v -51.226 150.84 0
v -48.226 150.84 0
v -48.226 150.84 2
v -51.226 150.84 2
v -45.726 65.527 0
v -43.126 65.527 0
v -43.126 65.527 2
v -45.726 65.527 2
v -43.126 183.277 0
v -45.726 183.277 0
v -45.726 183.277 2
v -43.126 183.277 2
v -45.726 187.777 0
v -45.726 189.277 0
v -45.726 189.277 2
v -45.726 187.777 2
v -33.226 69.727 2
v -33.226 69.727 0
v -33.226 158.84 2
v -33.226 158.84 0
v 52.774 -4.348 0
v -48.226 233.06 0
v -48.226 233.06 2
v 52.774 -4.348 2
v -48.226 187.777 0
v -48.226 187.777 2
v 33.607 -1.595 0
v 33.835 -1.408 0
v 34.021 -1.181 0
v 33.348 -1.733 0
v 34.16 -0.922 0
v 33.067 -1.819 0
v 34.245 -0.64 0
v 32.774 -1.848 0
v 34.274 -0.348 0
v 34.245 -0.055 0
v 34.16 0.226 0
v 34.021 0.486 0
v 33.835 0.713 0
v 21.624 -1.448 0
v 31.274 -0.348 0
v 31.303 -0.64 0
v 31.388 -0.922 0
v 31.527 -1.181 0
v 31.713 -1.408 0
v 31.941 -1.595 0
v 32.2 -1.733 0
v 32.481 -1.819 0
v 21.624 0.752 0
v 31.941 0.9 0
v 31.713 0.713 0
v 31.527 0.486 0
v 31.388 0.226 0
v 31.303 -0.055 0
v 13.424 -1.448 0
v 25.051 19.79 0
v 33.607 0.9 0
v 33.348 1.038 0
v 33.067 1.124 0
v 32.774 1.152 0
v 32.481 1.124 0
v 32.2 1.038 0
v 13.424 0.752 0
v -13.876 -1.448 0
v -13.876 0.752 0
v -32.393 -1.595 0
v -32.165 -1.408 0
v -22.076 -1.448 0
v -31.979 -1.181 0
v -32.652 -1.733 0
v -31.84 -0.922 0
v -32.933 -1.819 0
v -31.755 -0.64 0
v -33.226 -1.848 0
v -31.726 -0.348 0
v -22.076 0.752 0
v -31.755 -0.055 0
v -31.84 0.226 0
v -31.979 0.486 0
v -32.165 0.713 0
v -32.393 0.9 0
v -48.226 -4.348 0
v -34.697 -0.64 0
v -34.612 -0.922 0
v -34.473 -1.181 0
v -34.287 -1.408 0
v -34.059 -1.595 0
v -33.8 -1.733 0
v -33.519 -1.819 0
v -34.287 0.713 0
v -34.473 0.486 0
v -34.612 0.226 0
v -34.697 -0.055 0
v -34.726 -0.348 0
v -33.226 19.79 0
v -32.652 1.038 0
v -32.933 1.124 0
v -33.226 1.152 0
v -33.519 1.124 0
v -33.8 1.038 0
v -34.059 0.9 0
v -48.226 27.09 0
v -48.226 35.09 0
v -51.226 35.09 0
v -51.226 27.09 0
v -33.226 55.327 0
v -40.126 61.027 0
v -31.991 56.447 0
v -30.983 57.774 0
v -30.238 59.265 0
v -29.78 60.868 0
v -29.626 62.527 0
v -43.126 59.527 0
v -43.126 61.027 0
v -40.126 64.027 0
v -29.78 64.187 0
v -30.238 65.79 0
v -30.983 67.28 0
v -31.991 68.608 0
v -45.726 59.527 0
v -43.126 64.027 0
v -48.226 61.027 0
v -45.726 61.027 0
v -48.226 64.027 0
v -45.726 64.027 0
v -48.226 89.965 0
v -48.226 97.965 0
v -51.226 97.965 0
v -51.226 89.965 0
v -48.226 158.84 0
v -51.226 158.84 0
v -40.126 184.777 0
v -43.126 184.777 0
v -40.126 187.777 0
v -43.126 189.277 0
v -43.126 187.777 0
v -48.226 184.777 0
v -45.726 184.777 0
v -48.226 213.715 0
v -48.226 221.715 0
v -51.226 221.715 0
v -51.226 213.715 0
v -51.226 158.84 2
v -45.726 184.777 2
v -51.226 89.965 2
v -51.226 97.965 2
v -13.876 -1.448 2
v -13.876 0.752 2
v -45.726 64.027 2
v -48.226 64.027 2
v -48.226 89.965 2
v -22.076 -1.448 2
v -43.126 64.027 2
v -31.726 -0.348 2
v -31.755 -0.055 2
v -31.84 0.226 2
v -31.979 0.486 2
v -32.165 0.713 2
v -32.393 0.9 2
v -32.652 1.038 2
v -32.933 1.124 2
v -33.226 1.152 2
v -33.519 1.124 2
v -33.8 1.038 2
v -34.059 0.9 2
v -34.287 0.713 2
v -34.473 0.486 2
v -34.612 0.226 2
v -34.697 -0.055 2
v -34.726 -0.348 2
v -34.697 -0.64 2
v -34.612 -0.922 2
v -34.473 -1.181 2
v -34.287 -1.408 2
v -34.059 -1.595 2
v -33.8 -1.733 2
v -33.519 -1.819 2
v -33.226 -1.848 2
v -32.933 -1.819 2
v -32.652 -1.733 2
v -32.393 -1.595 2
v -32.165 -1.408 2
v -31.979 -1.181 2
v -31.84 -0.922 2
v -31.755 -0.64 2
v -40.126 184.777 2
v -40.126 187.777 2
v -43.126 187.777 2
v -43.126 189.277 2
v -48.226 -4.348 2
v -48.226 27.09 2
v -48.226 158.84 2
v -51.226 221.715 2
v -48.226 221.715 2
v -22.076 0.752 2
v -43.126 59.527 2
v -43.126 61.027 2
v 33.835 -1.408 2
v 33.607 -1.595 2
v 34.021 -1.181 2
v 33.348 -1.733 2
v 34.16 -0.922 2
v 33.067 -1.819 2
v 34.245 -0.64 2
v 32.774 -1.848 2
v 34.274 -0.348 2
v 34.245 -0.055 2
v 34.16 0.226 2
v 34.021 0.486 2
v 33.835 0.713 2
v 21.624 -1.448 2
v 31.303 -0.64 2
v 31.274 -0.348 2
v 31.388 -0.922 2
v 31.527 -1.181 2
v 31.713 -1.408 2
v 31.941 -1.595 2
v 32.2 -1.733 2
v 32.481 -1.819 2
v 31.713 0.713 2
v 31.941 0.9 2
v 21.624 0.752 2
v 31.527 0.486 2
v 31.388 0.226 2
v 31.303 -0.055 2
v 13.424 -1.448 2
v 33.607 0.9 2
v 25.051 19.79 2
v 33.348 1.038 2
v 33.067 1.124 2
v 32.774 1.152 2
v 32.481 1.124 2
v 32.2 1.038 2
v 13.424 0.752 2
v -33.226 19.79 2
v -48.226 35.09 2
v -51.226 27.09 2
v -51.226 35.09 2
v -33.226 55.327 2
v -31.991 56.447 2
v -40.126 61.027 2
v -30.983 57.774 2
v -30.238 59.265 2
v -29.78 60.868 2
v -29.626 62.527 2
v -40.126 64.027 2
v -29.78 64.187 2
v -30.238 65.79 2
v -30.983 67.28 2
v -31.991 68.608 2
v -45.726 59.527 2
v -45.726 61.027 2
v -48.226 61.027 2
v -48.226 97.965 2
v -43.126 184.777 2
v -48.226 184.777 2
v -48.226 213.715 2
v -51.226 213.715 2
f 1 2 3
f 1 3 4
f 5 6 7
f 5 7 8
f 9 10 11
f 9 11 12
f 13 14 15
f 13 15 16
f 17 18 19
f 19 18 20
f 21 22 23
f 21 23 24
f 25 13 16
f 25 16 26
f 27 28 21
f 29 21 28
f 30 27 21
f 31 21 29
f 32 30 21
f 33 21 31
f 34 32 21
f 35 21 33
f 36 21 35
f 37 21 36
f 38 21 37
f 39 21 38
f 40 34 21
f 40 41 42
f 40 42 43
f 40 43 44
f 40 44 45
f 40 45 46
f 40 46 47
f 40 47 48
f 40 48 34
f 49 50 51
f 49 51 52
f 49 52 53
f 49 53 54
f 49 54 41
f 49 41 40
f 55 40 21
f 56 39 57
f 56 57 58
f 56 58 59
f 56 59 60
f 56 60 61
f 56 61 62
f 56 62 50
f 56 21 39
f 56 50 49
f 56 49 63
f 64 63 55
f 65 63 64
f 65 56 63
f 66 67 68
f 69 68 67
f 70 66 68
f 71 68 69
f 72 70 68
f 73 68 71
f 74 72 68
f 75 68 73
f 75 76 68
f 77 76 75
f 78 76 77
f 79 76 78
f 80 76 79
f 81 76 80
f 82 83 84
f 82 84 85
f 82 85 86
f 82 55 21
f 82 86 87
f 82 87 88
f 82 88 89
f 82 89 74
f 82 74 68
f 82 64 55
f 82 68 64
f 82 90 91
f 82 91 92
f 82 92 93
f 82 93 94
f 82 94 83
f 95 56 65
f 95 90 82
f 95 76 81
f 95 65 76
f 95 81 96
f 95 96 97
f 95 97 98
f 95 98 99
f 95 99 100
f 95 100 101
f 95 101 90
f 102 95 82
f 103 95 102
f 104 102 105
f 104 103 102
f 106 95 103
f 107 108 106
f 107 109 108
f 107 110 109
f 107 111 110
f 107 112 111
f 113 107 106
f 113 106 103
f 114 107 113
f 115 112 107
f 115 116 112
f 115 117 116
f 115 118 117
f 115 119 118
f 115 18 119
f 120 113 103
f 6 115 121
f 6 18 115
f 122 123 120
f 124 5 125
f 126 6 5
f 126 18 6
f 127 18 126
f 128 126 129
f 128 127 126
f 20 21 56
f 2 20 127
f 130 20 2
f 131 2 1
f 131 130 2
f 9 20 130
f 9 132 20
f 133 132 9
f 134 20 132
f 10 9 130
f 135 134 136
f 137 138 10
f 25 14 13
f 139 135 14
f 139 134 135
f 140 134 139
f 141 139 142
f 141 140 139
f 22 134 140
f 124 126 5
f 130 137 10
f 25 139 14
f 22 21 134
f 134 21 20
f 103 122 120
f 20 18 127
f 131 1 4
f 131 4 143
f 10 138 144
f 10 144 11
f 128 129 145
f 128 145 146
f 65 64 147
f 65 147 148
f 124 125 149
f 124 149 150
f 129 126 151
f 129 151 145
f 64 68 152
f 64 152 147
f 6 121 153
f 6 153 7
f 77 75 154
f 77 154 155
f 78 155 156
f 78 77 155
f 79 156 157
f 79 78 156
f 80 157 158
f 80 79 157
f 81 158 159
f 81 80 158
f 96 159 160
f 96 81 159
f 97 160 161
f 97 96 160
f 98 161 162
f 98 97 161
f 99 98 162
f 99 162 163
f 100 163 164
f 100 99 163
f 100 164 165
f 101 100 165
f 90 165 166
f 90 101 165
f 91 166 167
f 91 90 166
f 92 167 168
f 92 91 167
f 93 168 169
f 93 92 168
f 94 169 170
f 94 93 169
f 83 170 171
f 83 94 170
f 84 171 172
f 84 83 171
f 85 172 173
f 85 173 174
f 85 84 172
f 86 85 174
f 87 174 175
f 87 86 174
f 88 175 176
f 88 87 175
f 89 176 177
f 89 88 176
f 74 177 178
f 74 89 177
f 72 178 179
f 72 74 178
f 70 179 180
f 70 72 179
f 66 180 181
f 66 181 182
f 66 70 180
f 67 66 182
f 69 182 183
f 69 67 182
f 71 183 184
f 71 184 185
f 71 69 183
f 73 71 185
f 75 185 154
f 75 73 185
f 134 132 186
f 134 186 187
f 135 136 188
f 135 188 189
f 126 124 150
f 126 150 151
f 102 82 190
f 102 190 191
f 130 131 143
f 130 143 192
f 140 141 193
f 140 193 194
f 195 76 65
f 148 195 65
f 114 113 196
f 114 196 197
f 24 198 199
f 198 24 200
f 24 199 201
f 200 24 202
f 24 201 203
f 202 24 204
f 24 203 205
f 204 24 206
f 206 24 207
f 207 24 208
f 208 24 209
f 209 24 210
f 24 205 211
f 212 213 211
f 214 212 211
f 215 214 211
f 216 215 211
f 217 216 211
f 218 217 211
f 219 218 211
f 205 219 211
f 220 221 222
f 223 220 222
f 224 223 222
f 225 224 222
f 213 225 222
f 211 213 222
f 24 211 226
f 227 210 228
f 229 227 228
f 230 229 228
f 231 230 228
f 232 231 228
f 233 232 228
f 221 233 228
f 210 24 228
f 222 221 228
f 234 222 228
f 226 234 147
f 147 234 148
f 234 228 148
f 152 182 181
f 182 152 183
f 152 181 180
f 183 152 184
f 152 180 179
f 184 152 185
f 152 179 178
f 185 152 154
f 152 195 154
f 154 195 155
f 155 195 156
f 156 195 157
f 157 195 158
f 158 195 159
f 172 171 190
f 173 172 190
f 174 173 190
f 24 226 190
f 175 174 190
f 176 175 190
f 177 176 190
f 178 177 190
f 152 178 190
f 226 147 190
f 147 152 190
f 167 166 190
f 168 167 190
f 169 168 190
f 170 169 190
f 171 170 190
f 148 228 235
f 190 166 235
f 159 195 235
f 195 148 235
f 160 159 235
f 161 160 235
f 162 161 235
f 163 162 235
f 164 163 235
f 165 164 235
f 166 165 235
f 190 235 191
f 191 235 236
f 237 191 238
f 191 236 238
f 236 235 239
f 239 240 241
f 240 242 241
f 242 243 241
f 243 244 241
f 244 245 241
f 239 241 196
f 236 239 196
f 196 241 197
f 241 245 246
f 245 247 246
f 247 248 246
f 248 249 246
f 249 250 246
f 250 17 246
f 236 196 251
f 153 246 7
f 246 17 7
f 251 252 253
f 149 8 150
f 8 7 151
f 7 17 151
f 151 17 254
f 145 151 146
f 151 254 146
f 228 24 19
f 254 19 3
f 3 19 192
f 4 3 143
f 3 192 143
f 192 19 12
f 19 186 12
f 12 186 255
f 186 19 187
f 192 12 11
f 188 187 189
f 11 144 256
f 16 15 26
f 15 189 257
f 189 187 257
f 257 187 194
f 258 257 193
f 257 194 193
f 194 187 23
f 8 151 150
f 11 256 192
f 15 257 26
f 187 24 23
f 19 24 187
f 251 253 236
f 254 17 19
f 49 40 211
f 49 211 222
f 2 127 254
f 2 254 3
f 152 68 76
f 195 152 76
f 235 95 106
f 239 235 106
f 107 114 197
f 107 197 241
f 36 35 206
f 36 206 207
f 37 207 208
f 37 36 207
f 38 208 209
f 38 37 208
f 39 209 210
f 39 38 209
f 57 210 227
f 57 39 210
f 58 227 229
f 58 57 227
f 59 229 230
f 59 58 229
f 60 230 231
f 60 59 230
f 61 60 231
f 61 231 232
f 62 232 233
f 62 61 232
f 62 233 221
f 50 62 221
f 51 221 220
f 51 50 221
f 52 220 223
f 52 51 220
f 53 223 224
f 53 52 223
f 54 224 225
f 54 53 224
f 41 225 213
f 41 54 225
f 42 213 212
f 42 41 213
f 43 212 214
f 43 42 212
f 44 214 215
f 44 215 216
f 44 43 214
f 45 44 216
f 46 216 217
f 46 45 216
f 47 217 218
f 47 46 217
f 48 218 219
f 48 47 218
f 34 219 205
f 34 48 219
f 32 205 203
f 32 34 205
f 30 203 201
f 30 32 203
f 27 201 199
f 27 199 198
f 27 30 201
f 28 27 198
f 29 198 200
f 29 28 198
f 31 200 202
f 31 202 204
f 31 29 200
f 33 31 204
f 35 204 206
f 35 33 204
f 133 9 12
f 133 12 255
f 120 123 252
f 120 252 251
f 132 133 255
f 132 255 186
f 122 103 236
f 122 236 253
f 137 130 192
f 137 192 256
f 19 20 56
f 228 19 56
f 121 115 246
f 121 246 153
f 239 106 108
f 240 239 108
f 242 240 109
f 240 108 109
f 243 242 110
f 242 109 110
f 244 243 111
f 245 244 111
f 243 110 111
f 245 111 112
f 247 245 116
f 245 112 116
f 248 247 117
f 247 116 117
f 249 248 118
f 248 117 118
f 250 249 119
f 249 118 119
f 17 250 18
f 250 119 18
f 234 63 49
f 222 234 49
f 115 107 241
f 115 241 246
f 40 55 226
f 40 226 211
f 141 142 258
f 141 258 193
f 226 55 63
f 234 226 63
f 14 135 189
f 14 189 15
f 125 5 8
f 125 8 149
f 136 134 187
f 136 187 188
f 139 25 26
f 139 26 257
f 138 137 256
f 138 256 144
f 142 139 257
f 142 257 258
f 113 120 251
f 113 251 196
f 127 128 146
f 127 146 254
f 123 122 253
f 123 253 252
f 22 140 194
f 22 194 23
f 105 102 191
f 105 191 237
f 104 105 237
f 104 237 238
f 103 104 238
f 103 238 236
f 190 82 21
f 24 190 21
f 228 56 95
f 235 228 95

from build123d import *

# Parameters (mm, degrees)
SKETCH_1_R      = 1.5
SKETCH_1_W      = 8.2
SKETCH_1_H      = 2.2
EXTRUDE_1_DEPTH = 2


with BuildPart() as part:
    # 草图1 → 凸台-拉伸1 (new body)
    with BuildSketch(Plane.XY):
        Polygon((-45.72603831, 61.027402263), (-45.72603831, 59.527402263), (-43.12603831, 59.527402263), (-43.12603831, 61.027402263), (-40.12603831, 61.027402263), (-40.12603831, 64.027402263), (-43.12603831, 64.027402263), (-43.12603831, 65.527402263), (-45.72603831, 65.527402263), (-45.72603831, 64.027402263), (-48.22603831, 64.027402263), (-48.22603831, 89.964902263), (-51.22603831, 89.964902263), (-51.22603831, 97.964902263), (-48.22603831, 97.964902263), (-48.22603831, 150.839902263), (-51.22603831, 150.839902263), (-51.22603831, 158.839902263), (-48.22603831, 158.839902263), (-48.22603831, 184.777402263), (-45.72603831, 184.777402263), (-45.72603831, 183.277402263), (-43.12603831, 183.277402263), (-43.12603831, 184.777402263), (-40.12603831, 184.777402263), (-40.12603831, 187.777402263), (-43.12603831, 187.777402263), (-43.12603831, 189.277402263), (-45.72603831, 189.277402263), (-45.72603831, 187.777402263), (-48.22603831, 187.777402263), (-48.22603831, 213.714902263), (-51.22603831, 213.714902263), (-51.22603831, 221.714902263), (-48.22603831, 221.714902263), (-48.22603831, 233.059504861), (52.77396169, -4.347597737), (19.52396169, -4.347597737), (-17.97603831, -4.347597737), (-48.22603831, -4.347597737), (-48.22603831, 27.089902263), (-51.22603831, 27.089902263), (-51.22603831, 35.089902263), (-48.22603831, 35.089902263), (-48.22603831, 61.027402263), align=None)
        with Locations((-33.22603831, -0.347597737)):
            Circle(SKETCH_1_R, mode=Mode.SUBTRACT)
        with Locations((32.77396169, -0.347597737)):
            Circle(SKETCH_1_R, mode=Mode.SUBTRACT)
        with Locations((-17.97603831, -0.347597737)):
            Rectangle(SKETCH_1_W, SKETCH_1_H, mode=Mode.SUBTRACT)
        with Locations((17.52396169, -0.347597737)):
            Rectangle(SKETCH_1_W, SKETCH_1_H, mode=Mode.SUBTRACT)
        with BuildLine():
            Line((-33.22603831, 158.839902263), (25.051240135, 19.790255804))
            Line((25.051240135, 19.790255804), (-29.798759865, 19.790255804))
            Line((-29.798759865, 19.790255804), (-33.22603831, 19.790255804))
            Line((-33.22603831, 19.790255804), (-33.22603831, 27.089902263))
            Line((-33.22603831, 27.089902263), (-33.22603831, 55.327402263))
            ThreePointArc((-33.22603831, 55.327402263), (-29.62603831, 62.527402263), (-33.22603831, 69.727402263))
            Line((-33.22603831, 69.727402263), (-33.22603831, 158.839902263))
        make_face(mode=Mode.SUBTRACT)
    extrude(amount=EXTRUDE_1_DEPTH)


solid = part.part
